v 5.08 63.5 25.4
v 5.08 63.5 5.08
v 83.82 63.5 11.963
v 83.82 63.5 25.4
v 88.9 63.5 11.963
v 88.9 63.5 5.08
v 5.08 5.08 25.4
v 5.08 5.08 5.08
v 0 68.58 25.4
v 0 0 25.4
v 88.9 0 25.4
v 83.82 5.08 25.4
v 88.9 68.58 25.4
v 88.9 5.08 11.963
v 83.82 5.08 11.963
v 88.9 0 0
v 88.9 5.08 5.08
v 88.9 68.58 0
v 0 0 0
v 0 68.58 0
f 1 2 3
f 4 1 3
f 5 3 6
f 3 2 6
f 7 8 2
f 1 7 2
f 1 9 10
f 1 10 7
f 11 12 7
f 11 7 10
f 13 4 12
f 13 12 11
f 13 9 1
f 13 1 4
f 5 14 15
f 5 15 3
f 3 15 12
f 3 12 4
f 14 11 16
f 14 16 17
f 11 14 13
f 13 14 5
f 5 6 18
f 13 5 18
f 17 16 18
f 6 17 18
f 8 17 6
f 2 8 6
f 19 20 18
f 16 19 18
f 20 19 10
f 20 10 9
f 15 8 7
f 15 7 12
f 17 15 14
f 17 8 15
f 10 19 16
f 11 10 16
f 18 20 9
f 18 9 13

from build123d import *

# Parameters (mm, degrees)
F0_W     = 78.74
F0_H     = 58.42
F1_DEPTH = 5.08
F0_W_2   = 88.9
F0_H_2   = 68.58
F2_DEPTH = 25.4
F3_W     = 58.42
F3_H     = 6.883326
F4_DEPTH = 5.08


with BuildPart() as f1:
    # F0 (on Top) → F1 (new body)
    with BuildSketch(Plane.XY):
        with Locations((44.45, 34.29)):
            Rectangle(F0_W, F0_H)
    extrude(amount=F1_DEPTH)

    # F0 (on Top) → F2 (join)
    with BuildSketch(Plane.XY):
        with Locations((44.45, 34.29)):
            Rectangle(F0_W_2, F0_H_2)
        with Locations((44.45, 34.29)):
            Rectangle(F0_W, F0_H, mode=Mode.SUBTRACT)
    extrude(amount=F2_DEPTH)

    # F3 (on face) → F4 (cut)
    with BuildSketch(Plane.YZ.offset(88.9)):
        with Locations((34.29, 8.521663)):
            Rectangle(F3_W, F3_H)
    extrude(amount=-F4_DEPTH, mode=Mode.SUBTRACT)


solid = f1.part
